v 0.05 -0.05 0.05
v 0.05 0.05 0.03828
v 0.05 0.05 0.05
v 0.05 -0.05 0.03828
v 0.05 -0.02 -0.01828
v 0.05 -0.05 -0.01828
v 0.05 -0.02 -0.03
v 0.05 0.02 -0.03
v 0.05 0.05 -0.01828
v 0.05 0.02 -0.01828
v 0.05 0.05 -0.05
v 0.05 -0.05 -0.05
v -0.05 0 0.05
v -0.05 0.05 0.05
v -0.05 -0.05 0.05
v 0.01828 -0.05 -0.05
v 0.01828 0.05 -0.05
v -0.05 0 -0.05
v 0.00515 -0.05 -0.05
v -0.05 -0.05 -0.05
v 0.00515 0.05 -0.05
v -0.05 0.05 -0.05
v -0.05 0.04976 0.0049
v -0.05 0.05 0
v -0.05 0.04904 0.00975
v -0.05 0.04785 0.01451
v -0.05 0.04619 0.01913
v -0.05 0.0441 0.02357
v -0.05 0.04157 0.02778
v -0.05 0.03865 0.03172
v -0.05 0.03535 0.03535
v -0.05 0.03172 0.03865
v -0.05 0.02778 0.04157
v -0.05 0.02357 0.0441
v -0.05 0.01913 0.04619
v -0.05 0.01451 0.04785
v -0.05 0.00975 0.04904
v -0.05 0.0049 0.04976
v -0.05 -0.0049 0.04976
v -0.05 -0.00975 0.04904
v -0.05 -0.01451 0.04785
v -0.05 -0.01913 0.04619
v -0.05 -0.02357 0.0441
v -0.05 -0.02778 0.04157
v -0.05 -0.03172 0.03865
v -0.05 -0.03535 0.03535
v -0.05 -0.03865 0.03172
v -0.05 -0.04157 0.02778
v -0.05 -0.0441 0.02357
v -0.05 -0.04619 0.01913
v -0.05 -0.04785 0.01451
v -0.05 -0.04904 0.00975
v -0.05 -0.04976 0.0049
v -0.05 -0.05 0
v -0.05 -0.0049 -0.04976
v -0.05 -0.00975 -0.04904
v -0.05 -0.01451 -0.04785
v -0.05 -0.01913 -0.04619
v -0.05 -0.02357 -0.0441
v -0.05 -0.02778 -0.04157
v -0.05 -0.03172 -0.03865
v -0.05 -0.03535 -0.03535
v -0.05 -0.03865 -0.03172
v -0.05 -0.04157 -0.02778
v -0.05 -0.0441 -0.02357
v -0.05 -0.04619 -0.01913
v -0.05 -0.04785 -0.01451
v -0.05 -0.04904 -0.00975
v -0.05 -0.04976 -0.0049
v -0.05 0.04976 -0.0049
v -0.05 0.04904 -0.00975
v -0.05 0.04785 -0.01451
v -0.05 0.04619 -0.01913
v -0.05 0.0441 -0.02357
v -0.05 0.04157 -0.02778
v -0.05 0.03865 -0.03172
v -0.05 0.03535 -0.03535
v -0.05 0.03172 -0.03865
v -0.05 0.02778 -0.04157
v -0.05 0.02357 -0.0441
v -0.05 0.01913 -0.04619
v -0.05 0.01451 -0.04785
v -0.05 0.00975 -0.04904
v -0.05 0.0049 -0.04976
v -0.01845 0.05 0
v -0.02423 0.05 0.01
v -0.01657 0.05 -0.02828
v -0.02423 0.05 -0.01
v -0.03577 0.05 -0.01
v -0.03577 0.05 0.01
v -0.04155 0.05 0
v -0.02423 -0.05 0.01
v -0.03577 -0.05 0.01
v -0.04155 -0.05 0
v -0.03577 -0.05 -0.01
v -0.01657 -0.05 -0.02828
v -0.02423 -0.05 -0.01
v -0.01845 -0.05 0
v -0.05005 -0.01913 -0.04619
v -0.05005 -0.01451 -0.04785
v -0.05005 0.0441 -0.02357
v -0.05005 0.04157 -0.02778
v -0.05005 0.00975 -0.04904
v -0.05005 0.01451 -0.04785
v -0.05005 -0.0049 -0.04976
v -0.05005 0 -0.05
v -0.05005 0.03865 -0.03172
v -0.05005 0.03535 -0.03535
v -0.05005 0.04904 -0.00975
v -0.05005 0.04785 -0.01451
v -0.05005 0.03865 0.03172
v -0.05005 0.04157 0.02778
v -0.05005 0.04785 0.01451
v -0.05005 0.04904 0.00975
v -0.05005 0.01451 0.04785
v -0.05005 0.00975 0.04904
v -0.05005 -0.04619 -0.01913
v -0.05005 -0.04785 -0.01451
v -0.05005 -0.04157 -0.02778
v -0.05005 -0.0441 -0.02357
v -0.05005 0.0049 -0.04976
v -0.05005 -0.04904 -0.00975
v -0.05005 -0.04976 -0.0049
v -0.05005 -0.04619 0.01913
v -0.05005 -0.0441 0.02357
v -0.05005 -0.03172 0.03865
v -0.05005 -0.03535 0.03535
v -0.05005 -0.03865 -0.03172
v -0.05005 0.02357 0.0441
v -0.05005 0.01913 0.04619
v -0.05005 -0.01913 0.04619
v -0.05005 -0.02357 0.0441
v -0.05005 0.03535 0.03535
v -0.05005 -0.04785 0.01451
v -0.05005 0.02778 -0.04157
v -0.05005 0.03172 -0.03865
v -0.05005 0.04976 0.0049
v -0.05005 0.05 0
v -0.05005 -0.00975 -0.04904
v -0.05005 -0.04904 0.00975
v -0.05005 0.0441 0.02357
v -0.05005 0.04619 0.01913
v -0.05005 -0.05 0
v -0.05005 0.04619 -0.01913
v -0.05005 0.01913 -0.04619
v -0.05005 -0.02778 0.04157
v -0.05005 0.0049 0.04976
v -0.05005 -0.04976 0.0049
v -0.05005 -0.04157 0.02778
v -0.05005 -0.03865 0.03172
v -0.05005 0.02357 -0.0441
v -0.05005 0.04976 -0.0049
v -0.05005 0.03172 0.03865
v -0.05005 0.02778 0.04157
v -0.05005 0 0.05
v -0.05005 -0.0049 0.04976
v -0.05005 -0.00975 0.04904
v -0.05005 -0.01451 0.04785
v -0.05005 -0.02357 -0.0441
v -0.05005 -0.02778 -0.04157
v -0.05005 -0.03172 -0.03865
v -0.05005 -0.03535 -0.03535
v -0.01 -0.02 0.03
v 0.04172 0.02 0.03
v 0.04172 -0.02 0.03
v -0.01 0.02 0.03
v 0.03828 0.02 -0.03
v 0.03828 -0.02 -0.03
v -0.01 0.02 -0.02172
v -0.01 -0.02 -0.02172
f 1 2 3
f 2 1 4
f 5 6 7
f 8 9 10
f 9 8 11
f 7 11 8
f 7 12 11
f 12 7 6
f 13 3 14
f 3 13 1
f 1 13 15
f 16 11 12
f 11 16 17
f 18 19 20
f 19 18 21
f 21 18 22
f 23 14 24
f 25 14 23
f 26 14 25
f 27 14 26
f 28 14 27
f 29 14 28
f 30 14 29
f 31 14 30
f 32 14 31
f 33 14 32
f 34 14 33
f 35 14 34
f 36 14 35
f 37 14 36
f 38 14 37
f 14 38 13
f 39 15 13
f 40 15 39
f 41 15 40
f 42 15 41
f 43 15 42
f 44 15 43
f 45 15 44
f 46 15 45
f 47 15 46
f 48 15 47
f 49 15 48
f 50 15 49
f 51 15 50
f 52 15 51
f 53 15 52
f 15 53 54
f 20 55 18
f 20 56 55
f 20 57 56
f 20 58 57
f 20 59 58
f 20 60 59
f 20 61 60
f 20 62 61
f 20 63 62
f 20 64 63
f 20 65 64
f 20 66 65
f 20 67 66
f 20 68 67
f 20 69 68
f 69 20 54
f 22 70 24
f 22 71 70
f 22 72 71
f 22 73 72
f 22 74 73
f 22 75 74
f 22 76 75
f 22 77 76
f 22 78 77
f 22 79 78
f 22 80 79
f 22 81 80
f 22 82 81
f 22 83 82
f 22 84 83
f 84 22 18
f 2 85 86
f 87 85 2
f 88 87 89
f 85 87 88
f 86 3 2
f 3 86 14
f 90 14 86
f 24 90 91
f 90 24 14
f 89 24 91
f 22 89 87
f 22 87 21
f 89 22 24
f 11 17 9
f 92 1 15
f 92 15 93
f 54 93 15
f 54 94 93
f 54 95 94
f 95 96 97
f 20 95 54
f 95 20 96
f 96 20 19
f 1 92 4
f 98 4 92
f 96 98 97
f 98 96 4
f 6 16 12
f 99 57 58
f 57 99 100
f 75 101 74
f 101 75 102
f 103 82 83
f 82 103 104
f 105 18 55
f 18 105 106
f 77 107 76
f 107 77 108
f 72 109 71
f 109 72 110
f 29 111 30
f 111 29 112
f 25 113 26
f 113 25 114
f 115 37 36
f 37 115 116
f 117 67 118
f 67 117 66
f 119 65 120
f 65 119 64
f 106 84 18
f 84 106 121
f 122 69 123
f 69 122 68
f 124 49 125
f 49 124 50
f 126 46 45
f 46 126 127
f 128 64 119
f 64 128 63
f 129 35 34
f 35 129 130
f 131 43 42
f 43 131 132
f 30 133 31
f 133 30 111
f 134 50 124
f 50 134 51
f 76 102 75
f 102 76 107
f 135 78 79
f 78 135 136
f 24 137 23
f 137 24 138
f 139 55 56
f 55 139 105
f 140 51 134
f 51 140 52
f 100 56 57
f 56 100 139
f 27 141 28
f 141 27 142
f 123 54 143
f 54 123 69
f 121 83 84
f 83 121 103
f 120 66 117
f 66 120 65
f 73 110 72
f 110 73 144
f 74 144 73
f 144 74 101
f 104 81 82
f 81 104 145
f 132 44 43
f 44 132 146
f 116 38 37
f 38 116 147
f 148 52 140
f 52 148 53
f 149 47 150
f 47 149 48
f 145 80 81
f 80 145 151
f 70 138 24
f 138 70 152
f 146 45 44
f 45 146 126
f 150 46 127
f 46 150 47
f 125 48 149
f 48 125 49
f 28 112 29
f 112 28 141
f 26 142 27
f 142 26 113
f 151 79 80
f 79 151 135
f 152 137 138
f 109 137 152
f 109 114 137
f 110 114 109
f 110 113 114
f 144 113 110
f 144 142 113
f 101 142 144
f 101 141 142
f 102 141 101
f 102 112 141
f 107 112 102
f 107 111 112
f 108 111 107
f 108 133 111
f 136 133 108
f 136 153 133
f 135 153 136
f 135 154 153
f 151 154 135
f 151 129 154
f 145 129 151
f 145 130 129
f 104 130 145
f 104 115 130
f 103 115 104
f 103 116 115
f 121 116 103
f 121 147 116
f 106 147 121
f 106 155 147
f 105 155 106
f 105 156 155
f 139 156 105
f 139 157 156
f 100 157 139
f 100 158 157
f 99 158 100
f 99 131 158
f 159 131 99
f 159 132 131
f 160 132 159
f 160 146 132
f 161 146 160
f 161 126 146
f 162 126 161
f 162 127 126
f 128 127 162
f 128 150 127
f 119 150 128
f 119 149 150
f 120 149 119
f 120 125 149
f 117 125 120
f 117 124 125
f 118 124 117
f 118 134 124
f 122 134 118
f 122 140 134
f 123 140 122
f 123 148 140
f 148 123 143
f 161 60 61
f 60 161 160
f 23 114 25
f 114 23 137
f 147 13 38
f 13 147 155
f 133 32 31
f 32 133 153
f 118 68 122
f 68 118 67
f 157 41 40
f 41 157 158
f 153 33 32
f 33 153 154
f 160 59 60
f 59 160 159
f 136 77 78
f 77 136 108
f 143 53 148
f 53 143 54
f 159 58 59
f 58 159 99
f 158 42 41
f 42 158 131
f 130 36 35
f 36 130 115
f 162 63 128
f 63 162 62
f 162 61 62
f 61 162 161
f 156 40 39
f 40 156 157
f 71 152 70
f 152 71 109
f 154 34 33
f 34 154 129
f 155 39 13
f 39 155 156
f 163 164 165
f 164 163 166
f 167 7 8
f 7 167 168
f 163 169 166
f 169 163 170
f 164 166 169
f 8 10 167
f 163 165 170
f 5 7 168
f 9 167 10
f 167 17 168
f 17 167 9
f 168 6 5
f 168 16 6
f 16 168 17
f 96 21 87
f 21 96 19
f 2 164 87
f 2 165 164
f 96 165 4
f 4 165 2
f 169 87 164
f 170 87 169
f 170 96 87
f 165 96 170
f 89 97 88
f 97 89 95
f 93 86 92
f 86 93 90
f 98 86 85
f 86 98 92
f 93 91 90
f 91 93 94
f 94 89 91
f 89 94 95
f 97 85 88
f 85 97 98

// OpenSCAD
$fn=64;

L = 0.1;
W = 0.1;
H = 0.1;

slot_w = 0.04;
slot_h = 0.06;
slot_len = 0.06;

end_round_r = 0.05;

chamfer_len = 0.02;

hex_flat = 0.02;
hex_r = hex_flat / sqrt(3);
hex_len = W + 0.02;

hex_x = -0.03;

module hex_prism(r, h){
    cylinder(r=r, h=h, $fn=6, center=true);
}

module body(){
    union(){
        translate([0,0,0]) cube([L, W, H], center=true);
        translate([-L/2, 0, 0])
            rotate([0,90,0])
                cylinder(r=end_round_r, h=0.0001, center=true);
    }
}

module chamfer_cut(){
    translate([L/2 - chamfer_len/2, 0, 0])
        rotate([0,45,0])
            cube([chamfer_len*2, W*1.2, H*1.2], center=true);
}

module slot_cut(){
    translate([L/2 - slot_len/2, 0, 0])
        cube([slot_len, slot_w, slot_h], center=true);
}

module hex_hole(){
    translate([hex_x, 0, 0])
        rotate([90,0,0])
            hex_prism(hex_r, hex_len);
}

difference(){
    body();
    slot_cut();
    chamfer_cut();
    hex_hole();
}
